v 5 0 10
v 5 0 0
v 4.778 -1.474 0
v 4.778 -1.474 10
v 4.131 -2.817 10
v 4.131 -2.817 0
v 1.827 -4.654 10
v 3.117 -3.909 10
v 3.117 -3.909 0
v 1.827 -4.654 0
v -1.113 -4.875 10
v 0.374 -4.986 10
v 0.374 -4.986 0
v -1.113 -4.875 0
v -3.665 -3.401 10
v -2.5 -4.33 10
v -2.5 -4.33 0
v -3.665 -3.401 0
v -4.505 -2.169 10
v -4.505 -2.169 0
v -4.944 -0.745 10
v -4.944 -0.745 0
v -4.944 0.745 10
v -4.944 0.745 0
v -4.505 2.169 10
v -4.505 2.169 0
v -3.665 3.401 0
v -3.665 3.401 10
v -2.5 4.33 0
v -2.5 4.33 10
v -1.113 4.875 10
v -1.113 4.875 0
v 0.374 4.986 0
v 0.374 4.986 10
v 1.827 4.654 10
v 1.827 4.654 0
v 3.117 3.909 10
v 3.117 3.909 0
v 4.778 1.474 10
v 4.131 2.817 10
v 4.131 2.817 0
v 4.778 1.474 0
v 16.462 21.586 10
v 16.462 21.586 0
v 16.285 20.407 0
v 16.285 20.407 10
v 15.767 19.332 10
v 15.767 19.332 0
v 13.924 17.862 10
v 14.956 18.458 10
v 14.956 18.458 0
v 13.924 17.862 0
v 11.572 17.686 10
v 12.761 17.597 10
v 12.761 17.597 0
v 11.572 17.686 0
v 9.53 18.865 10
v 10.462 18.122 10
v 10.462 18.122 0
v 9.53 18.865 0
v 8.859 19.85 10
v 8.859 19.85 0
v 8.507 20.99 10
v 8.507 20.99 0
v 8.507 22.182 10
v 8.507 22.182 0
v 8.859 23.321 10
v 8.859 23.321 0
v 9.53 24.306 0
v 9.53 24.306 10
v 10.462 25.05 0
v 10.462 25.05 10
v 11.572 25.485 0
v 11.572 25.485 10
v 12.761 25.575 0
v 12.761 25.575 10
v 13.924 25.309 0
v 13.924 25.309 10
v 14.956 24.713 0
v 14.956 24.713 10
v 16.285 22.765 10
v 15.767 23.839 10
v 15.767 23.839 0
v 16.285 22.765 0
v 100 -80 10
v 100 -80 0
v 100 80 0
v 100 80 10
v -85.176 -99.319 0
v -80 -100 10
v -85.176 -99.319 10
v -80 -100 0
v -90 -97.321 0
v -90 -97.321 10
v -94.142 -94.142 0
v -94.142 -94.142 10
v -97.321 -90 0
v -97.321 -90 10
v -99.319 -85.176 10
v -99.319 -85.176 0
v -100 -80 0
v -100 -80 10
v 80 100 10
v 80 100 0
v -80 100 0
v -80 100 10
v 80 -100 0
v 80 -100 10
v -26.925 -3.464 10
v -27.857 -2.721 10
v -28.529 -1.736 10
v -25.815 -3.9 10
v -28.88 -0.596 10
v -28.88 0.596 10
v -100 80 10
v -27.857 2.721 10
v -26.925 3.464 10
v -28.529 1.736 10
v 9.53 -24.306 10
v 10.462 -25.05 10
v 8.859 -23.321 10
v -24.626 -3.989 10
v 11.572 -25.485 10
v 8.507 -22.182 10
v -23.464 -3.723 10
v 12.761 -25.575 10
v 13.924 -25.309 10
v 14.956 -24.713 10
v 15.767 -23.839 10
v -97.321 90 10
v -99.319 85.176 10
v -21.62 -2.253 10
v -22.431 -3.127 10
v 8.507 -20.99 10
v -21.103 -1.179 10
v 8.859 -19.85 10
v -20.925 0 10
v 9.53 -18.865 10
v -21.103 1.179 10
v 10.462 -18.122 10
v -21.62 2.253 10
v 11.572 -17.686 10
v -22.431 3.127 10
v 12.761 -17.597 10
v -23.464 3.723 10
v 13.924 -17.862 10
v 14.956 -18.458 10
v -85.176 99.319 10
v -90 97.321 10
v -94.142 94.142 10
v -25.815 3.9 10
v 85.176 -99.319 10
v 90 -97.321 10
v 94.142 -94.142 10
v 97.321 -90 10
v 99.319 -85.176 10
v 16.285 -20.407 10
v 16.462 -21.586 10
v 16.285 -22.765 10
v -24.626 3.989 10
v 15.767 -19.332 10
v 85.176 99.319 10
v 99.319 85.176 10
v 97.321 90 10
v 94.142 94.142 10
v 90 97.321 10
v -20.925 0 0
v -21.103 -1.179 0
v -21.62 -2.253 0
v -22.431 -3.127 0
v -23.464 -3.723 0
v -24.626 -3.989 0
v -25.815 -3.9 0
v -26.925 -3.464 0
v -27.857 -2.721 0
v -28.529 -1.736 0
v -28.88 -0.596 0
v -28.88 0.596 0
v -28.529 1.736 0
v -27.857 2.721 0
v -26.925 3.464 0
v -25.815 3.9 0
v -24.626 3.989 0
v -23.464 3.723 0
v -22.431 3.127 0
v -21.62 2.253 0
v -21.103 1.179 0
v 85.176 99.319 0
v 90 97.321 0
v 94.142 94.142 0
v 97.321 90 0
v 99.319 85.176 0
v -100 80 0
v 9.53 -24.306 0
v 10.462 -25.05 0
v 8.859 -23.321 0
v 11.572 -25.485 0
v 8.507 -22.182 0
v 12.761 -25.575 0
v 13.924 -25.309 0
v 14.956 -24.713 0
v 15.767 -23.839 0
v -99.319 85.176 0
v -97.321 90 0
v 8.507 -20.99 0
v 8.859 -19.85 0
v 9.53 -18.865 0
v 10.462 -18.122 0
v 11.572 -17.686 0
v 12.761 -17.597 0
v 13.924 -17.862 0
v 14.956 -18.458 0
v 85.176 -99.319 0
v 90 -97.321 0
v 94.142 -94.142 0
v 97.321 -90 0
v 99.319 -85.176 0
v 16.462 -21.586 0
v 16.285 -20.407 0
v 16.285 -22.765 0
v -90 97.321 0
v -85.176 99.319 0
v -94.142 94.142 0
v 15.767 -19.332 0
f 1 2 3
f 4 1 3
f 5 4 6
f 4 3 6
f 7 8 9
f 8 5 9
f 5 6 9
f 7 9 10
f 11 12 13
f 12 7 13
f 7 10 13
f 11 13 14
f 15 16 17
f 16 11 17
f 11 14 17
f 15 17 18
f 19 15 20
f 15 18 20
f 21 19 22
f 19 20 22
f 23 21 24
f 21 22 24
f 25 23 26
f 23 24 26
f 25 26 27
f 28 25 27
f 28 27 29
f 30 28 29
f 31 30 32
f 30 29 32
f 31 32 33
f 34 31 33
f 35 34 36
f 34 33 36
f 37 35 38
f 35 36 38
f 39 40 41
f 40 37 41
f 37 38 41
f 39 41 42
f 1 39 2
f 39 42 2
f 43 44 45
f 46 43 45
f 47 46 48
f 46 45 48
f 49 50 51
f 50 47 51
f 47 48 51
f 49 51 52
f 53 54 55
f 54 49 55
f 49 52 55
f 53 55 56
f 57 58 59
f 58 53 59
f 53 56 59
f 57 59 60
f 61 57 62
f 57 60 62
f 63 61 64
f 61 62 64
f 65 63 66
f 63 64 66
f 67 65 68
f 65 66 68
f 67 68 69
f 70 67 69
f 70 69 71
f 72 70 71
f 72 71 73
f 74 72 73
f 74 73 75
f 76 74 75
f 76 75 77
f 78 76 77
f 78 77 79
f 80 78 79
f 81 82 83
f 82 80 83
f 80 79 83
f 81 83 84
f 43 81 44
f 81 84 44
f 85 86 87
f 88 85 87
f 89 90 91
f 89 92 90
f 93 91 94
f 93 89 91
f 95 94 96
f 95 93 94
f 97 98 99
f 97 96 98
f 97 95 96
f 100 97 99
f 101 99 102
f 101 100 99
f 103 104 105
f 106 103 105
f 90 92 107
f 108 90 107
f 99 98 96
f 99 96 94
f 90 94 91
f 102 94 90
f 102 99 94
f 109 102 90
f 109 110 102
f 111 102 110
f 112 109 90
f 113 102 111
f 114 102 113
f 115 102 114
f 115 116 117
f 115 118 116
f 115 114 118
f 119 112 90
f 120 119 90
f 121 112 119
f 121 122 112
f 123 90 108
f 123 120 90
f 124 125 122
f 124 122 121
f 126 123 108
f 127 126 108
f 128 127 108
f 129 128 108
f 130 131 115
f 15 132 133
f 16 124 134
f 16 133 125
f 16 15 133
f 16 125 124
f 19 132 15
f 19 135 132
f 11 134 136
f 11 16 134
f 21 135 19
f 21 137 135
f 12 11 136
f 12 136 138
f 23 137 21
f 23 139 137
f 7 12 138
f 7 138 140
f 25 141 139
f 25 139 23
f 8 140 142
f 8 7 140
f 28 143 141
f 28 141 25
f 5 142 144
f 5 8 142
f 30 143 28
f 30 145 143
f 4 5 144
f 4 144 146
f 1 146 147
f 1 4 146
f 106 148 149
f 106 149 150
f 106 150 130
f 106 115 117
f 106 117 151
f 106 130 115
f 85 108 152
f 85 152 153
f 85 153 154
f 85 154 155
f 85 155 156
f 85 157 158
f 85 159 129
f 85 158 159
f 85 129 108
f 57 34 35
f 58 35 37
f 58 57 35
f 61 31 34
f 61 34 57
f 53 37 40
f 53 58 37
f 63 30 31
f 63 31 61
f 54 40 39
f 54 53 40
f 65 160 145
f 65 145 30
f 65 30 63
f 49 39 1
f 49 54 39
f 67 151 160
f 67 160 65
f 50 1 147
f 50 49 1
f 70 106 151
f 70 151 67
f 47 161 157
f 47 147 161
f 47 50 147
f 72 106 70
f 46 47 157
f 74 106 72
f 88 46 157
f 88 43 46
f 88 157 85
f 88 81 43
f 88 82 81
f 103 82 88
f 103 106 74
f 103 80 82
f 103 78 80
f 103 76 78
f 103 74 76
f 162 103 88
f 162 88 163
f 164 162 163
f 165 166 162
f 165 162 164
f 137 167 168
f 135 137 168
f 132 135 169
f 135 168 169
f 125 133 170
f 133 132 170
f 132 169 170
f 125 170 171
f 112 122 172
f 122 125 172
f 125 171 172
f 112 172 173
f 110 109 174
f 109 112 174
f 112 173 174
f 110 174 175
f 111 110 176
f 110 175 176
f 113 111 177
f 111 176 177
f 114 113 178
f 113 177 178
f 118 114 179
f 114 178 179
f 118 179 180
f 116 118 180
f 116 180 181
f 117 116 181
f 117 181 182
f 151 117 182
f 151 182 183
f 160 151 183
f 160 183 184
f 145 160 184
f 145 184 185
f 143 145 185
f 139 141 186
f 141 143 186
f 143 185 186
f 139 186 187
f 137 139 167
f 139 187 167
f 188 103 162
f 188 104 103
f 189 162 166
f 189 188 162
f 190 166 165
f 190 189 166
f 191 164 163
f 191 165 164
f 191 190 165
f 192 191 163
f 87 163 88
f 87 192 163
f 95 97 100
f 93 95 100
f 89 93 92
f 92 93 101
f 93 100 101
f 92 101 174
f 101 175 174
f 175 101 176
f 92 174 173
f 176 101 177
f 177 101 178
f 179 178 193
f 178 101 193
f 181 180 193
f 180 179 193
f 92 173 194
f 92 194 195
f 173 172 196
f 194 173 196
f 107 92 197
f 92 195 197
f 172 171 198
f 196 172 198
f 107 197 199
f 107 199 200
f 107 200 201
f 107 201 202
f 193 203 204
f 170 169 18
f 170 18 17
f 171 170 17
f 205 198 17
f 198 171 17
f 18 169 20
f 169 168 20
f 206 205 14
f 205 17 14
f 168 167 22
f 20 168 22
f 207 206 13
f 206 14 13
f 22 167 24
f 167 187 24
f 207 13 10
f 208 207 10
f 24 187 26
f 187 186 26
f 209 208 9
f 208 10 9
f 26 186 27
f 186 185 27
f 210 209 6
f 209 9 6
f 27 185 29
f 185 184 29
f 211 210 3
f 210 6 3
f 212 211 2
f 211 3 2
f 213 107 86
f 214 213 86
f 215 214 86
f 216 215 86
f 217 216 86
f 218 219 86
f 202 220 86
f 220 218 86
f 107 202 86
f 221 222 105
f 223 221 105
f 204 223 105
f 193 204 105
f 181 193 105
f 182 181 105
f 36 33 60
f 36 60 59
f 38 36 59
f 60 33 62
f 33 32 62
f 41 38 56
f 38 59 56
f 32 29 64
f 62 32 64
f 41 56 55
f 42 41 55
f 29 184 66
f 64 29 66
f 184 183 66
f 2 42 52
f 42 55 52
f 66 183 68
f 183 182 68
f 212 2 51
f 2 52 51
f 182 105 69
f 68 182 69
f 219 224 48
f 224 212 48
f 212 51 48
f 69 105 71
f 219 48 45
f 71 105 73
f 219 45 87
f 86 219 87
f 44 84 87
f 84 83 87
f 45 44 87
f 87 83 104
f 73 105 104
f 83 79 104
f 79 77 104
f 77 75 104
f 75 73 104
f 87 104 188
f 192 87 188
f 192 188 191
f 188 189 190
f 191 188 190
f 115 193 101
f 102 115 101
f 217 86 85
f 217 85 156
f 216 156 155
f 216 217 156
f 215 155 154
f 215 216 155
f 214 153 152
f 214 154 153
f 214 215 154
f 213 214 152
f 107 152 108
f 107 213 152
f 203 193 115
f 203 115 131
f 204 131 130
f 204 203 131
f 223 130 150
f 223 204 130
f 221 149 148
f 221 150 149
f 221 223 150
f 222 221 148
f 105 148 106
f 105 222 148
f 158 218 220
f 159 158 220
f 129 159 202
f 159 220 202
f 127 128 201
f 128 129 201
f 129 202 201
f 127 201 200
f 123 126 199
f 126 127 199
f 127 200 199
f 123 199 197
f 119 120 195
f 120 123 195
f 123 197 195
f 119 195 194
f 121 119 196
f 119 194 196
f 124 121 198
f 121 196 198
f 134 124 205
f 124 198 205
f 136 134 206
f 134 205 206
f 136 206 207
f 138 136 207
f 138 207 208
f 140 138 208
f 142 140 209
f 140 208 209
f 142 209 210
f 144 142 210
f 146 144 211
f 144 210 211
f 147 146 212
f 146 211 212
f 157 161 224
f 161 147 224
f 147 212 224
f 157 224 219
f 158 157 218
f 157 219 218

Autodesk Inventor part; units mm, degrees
ref_plane "YZ Plane" through (0, 0, 0) normal (1, 0, 0) x (0, 1, 0)
ref_plane "XZ Plane" through (0, 0, 0) normal (0, 1, 0) x (-1, 0, 0)
ref_plane "XY Plane" through (0, 0, 0) normal (0, 0, 1) x (1, 0, 0)
sketch "Sketch1" plane through (0, 0, 0) normal (0, 0, 1) x (1, 0, 0)
  circle A0 centre (0, 0) radius 14.925 construction
  circle A1 centre (12.4625, 21.5857) radius 4
  circle A2 centre (-24.925, 0) radius 4
  circle A3 centre (12.4625, -21.5857) radius 4
  line L0 (12.4625, -21.5857) -> (12.4625, 21.5857) construction
  line L1 (12.4625, 21.5857) -> (-24.925, 0) construction
  line L2 (-24.925, 0) -> (12.4625, -21.5857) construction
  line L3 (12.4625, 21.5857) -> (7.4625, 12.9254) construction
  line L4 (-14.925, 0) -> (-24.925, 0) construction
  line L5 (12.4625, -21.5857) -> (7.4625, -12.9254) construction
  line L6 (80, 100) -> (-80, 100)
  line L7 (-100, 80) -> (-100, -80)
  line L8 (-80, -100) -> (80, -100)
  line L9 (100, -80) -> (100, 80)
  arc A4 (100, 80) -> (80, 100) centre (80, 80) ccw
  arc A5 (-80, 100) -> (-100, 80) centre (-80, 80) ccw
  arc A6 (-100, -80) -> (-80, -100) centre (-80, -80) ccw
  arc A7 (80, -100) -> (100, -80) centre (80, -80) ccw
  circle A8 centre (0, 0) radius 5
  point P0 (100, 100)
  point P1 (-100, -100)
  point P2 (-100, 100)
  dimension "d0" = 29.85
  dimension "d1" = 8
  dimension "d2" = 10
  dimension "d3" = 200
  dimension "d4" = 200
  dimension "d5" = 100
  dimension "d6" = 100
  dimension "d7" = 20
  dimension "d10" = 10
extrude "Extrusion1" add sketch "Sketch1" along normal blind 10
properties part number "Tractor_Static_4"
